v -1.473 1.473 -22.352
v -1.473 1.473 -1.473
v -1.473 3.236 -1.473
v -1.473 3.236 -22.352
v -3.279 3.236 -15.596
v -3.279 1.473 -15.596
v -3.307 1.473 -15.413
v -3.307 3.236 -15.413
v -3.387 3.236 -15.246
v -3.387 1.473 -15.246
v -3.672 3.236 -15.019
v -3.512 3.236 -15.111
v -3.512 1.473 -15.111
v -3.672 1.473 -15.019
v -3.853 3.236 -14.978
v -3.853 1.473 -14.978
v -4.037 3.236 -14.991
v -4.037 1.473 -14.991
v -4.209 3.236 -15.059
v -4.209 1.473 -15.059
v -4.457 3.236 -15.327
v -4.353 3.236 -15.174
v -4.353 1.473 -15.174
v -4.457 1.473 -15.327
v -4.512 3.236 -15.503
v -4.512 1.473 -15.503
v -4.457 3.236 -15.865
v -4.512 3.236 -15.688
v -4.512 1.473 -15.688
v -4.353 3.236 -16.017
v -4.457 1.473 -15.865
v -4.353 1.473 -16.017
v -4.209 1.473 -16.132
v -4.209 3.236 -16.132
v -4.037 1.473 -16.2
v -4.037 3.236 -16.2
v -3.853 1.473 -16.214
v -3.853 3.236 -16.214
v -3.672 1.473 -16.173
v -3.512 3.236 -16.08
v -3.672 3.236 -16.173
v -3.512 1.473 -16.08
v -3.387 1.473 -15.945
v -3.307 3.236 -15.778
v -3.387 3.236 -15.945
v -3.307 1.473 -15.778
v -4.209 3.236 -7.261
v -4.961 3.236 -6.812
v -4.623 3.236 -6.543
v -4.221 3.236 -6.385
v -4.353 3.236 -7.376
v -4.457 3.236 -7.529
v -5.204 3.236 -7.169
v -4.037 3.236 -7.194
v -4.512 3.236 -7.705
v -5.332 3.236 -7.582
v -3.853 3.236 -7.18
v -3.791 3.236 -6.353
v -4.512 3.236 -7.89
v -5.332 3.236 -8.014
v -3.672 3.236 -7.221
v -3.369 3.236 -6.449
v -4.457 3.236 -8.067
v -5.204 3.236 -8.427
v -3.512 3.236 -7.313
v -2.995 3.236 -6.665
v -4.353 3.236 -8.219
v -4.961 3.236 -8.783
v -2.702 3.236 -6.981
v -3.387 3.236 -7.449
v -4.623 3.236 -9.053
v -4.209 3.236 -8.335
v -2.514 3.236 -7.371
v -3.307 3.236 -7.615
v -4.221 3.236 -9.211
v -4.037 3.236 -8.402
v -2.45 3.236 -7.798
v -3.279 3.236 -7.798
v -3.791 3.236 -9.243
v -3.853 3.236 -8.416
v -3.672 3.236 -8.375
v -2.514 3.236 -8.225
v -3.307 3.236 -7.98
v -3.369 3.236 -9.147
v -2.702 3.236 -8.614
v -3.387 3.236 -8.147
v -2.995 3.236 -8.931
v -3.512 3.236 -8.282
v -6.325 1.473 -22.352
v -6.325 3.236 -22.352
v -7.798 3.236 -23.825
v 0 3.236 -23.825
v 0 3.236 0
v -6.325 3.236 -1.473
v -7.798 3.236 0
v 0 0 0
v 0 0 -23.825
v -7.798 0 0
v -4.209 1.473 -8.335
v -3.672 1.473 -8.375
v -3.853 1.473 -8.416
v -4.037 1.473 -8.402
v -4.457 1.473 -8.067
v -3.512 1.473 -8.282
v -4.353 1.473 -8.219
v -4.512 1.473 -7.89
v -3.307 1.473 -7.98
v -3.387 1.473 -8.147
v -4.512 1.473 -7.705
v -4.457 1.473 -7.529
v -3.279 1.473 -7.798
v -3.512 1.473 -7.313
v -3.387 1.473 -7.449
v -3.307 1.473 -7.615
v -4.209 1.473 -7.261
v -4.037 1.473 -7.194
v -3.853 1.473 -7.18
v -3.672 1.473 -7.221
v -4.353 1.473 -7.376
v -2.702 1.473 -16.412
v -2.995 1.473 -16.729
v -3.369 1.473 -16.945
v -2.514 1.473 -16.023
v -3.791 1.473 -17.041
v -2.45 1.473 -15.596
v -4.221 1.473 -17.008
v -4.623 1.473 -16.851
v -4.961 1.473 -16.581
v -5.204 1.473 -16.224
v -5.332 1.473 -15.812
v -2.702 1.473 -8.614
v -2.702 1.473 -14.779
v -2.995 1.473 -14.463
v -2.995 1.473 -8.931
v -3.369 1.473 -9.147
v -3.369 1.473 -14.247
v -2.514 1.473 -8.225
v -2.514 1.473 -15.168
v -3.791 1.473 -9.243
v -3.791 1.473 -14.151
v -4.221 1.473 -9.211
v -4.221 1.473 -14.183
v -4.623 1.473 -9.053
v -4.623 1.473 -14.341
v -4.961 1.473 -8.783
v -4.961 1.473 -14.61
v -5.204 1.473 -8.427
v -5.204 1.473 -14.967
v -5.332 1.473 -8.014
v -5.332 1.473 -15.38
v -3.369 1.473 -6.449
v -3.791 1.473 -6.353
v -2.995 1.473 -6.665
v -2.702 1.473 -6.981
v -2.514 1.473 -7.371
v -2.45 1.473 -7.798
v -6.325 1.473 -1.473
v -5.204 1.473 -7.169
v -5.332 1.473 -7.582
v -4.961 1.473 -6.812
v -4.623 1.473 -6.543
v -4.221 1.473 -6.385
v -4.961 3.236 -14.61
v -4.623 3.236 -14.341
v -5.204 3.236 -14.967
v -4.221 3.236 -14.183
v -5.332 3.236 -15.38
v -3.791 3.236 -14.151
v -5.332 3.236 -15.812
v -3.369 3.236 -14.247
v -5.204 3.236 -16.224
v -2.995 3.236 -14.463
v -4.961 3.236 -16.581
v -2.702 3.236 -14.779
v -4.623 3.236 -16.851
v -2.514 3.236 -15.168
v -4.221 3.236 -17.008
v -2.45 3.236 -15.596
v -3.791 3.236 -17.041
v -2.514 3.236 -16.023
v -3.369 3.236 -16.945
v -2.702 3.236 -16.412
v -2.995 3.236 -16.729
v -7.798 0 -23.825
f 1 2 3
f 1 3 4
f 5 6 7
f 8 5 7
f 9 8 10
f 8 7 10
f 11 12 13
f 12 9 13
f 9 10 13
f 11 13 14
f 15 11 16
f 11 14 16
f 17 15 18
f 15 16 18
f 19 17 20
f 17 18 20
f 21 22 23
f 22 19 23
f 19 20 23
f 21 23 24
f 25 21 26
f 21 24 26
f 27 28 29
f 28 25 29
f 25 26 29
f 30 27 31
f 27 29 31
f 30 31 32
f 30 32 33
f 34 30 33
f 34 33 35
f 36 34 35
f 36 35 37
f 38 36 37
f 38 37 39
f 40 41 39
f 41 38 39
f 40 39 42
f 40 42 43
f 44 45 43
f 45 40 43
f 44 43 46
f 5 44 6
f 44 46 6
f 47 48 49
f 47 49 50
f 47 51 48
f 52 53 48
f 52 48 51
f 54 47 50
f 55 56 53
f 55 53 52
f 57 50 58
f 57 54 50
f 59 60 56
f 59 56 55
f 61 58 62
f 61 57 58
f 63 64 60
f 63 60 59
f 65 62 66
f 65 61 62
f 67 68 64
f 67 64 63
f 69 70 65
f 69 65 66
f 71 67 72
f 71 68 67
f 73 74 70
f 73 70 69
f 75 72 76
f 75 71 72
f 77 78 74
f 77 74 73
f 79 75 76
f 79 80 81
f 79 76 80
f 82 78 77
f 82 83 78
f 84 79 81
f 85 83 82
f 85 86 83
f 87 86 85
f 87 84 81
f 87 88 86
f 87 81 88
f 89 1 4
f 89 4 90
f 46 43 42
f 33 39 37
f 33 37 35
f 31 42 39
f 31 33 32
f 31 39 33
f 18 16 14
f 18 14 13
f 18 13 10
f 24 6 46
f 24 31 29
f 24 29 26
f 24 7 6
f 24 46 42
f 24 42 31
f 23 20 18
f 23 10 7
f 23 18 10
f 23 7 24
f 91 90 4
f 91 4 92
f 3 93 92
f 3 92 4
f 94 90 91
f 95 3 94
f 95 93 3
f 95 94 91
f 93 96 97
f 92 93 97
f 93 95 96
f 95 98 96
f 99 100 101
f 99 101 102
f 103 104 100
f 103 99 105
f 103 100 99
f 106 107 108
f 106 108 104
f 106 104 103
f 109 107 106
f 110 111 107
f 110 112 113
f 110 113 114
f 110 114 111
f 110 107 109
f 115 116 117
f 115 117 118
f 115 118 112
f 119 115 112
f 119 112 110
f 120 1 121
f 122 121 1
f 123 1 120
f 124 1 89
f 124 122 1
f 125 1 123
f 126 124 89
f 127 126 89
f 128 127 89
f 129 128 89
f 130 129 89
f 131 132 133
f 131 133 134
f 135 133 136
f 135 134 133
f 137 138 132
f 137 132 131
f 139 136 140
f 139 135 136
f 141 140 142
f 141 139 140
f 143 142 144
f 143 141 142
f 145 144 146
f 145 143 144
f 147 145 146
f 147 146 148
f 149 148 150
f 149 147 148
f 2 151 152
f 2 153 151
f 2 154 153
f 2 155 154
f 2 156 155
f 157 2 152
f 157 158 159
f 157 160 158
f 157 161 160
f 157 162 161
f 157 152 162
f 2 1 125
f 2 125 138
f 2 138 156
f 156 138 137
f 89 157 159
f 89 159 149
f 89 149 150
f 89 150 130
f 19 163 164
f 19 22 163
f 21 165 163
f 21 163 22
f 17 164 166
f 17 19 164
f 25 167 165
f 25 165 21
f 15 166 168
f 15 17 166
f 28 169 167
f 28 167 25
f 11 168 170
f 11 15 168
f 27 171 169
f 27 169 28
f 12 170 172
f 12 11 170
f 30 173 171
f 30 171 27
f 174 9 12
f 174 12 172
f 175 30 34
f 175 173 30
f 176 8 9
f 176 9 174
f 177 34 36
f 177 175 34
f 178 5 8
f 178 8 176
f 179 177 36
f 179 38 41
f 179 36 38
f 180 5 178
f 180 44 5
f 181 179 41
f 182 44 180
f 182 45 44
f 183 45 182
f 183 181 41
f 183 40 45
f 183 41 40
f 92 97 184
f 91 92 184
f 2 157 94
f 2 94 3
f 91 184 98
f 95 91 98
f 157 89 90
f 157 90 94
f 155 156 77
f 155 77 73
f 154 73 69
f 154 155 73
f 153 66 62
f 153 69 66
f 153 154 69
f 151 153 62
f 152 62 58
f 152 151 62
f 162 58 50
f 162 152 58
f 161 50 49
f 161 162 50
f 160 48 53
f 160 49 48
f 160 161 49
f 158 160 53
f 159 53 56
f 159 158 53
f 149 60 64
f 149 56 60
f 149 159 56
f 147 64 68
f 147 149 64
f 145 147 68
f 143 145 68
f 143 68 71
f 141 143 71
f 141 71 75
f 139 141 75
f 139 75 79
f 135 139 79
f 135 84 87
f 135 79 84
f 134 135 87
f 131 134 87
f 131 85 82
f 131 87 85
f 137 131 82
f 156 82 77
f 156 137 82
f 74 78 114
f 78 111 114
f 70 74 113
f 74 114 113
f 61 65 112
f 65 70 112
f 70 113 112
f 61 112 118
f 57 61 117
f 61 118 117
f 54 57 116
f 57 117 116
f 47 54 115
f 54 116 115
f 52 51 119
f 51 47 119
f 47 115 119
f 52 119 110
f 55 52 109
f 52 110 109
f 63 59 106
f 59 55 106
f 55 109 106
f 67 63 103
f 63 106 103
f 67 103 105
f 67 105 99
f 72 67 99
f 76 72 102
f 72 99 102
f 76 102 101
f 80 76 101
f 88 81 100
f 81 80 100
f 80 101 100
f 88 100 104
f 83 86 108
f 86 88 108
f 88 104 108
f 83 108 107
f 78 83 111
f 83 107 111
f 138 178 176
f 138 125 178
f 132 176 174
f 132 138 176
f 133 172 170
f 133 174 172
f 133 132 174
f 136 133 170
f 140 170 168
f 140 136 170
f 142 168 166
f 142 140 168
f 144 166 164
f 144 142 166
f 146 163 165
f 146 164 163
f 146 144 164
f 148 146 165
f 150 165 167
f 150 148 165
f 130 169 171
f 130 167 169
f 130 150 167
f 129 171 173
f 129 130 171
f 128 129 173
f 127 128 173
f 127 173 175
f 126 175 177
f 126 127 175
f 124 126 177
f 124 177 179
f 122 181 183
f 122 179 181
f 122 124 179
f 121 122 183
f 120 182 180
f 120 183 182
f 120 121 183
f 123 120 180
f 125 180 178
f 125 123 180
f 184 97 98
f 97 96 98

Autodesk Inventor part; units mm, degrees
ref_plane "YZ Plane" through (0, 0, 0) normal (1, 0, 0) x (0, 1, 0)
ref_plane "XZ Plane" through (0, 0, 0) normal (0, 1, 0) x (-1, 0, 0)
ref_plane "XY Plane" through (0, 0, 0) normal (0, 0, 1) x (1, 0, 0)
sketch "Sketch1" plane through (0, 0, 0) normal (0, 1, 0) x (-1, 0, 0)
  line L0 (0, 0) -> (0, -23.8252)
  line L1 (0, -23.8252) -> (7.7978, -23.8252)
  line L2 (7.7978, -23.8252) -> (7.7978, 0)
  line L3 (7.7978, 0) -> (0, 0)
  dimension "d0" = 23.8252
  dimension "d1" = 7.7978
extrude "Extrusion1" add sketch "Sketch1" along normal blind 3.236
shell "Shell1" thickness 1.4732 removed faces 1 at (-2.5993, 3.236, -7.9417)
sketch "Sketch3" plane through (-6.3246, 1.4732, -22.352) normal (0, 1, 0) x (1, 0, 0)
  point P0 (6.3246, -22.352)
sketch "Sketch4" plane through (-6.3246, 1.4732, -22.352) normal (0, 1, 0) x (1, 0, 0)
  line L0 (6.3246, -22.352) -> (2.4257, -22.352) construction
  line L1 (2.4257, -22.352) -> (2.4257, -18.4531) construction
  line L2 (2.4257, -18.4531) -> (6.3246, -18.4531) construction
  line L3 (6.3246, -18.4531) -> (6.3246, -22.352) construction
  circle A0 centre (2.4257, -18.4531) radius 2.4498 construction
  circle A1 centre (2.4257, -10.6553) radius 2.4498 construction
  line L4 (2.4257, -18.4531) -> (2.4257, -10.6553) construction
  circle A2 centre (2.4257, -14.5542) radius 1.4491
  circle A3 centre (2.4257, -14.5542) radius 0.6198
  dimension "d5" = 3.8989
  dimension "d6" = 3.8989
  dimension "d7" = 4.8997
  dimension "d10" = 7.7978
  dimension "d15" = 1.2395
extrude "Extrusion2" add sketch "Sketch4" along normal up to surface (1.7628 mm away)
pattern_linear "Rectangular Pattern1" count 2 spacing 7.7978 along (0, 0, -1) of "Extrusion2"
properties part number "1x3 short orange smooth" material "ABS Plastic"
